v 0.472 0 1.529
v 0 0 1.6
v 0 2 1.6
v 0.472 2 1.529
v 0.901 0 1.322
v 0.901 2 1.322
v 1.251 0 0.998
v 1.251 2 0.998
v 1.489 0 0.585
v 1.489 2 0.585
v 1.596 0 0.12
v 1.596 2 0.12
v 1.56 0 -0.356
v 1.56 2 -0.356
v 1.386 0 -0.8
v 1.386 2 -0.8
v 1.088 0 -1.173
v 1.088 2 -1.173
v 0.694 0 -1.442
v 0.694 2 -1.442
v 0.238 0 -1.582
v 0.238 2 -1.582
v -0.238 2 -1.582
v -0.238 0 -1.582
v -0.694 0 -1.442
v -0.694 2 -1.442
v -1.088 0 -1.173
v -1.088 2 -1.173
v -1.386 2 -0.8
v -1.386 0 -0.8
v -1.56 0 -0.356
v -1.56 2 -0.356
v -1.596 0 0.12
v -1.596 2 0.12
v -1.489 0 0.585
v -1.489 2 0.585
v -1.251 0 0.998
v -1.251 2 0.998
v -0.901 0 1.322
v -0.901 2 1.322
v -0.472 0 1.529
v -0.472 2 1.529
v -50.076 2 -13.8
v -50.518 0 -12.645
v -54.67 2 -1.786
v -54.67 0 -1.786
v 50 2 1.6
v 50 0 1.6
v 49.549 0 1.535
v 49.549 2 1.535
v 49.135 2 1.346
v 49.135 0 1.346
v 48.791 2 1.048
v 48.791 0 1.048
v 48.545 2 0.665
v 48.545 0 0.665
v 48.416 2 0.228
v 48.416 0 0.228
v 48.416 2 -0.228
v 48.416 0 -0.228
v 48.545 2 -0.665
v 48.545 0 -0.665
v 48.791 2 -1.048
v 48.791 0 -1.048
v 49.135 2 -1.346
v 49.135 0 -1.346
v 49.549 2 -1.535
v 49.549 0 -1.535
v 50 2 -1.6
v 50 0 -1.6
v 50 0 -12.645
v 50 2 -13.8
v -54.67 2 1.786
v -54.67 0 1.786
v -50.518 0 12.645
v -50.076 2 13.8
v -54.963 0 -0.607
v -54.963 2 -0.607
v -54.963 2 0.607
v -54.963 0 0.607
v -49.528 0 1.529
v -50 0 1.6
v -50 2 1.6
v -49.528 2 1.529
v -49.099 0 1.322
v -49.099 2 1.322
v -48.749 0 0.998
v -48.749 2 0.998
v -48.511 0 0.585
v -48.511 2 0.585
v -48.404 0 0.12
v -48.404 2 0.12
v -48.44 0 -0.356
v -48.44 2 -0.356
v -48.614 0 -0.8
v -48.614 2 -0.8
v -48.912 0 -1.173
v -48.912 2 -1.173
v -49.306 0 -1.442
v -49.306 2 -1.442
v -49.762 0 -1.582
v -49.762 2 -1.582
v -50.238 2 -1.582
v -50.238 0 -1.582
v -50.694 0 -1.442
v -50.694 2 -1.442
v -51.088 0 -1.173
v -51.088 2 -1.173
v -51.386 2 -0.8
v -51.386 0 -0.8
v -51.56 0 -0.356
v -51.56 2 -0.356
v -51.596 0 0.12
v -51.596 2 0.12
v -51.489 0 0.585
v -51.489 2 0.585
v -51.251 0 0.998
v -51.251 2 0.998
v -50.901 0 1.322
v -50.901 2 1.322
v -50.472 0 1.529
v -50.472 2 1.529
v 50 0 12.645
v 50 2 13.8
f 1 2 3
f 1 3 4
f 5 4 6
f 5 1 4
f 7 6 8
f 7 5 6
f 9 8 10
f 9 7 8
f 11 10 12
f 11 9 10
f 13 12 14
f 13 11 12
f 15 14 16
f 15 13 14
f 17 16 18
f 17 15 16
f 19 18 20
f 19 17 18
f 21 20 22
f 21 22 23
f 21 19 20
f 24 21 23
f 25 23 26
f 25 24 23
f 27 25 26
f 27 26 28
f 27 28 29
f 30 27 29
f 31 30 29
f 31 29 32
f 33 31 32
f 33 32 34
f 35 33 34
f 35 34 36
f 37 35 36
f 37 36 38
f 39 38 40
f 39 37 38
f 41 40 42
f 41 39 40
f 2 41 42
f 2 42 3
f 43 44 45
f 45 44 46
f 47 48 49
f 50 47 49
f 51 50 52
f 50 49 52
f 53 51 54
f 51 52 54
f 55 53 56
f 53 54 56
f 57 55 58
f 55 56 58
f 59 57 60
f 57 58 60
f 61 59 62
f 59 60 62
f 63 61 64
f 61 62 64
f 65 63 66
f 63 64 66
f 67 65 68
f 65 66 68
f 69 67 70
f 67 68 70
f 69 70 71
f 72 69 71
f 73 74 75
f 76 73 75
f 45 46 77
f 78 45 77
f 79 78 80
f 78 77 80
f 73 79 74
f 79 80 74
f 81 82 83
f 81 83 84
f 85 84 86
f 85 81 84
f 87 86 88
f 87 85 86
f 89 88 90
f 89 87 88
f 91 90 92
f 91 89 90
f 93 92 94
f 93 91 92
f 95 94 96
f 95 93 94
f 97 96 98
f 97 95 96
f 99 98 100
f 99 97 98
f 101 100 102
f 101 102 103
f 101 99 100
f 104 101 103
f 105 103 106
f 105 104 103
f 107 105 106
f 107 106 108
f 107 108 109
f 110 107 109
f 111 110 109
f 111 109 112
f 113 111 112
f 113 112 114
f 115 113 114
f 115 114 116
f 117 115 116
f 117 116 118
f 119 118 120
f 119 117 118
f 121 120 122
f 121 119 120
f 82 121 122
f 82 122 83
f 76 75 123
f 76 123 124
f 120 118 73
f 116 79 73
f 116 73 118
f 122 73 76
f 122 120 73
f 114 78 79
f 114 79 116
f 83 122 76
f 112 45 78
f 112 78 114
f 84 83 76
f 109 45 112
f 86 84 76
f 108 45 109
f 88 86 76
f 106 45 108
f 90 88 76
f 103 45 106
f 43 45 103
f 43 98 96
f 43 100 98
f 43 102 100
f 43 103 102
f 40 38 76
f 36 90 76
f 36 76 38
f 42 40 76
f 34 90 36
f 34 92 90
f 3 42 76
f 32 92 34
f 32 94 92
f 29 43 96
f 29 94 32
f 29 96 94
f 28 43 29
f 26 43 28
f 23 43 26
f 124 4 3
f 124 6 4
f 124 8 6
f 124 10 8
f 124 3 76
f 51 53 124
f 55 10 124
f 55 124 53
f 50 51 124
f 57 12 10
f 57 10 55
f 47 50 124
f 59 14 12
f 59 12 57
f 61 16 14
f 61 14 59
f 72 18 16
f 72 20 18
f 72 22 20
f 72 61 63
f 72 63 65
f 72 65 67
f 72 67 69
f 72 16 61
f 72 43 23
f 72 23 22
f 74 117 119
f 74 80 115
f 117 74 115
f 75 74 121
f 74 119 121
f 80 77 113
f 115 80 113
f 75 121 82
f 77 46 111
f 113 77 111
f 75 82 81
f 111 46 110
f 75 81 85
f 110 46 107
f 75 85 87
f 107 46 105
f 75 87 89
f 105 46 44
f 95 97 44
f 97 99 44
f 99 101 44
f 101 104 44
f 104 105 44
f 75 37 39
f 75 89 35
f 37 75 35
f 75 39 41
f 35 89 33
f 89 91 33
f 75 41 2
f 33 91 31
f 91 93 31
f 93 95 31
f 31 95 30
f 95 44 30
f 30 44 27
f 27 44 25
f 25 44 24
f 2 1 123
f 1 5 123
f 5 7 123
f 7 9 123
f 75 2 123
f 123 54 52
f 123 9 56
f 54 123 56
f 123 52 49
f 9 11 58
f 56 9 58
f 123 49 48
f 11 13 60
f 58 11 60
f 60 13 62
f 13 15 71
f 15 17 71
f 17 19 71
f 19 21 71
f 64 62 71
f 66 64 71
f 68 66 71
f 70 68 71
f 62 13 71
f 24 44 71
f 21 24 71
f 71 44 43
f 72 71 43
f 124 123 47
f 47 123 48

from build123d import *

# Parameters (mm, degrees)
SKETCH_1_R          = 1.6
EXTRUDE_1_DEPTH     = 2
CUT_EXTRUDE_1_DEPTH = 106.948100502


with BuildPart() as part:
    # Эскиз1 → Бобышка-Вытянуть1 (new body)
    with BuildSketch(Plane(origin=(0, 0, 0), x_dir=(1, 0, 0), z_dir=(0, 1, 0))):
        with BuildLine():
            Line((50, -14), (50, -1.6))
            ThreePointArc((50, -1.6), (48.4, 0), (50, 1.6))
            Line((50, 1.6), (50, 14))
            Line((50, 14), (-50, 14))
            Line((-50, 14), (-54.670248868, 1.785714286))
            ThreePointArc((-54.670248868, 1.785714286), (-55, 0), (-54.670248868, -1.785714286))
            Line((-54.670248868, -1.785714286), (-50, -14))
            Line((-50, -14), (50, -14))
        make_face()
        with Locations(Location((-50, 0, 0), (0, 0, 270))):
            Circle(SKETCH_1_R, mode=Mode.SUBTRACT)
        with Locations(Location((0, 0, 0), (0, 0, 270))):
            Circle(SKETCH_1_R, mode=Mode.SUBTRACT)
    extrude(amount=EXTRUDE_1_DEPTH)

    # Эскиз2 → Вырез-Вытянуть1 (cut, through all)
    with BuildSketch(Plane.ZY.offset(55)):
        Polygon((-14, 0), (-12.645299462, 0), (-13.8, 2), (-14, 2), align=None)
        Polygon((14, 2), (14, 0), (12.645299462, 0), (13.8, 2), align=None)
    extrude(amount=-CUT_EXTRUDE_1_DEPTH, mode=Mode.SUBTRACT)


solid = part.part
